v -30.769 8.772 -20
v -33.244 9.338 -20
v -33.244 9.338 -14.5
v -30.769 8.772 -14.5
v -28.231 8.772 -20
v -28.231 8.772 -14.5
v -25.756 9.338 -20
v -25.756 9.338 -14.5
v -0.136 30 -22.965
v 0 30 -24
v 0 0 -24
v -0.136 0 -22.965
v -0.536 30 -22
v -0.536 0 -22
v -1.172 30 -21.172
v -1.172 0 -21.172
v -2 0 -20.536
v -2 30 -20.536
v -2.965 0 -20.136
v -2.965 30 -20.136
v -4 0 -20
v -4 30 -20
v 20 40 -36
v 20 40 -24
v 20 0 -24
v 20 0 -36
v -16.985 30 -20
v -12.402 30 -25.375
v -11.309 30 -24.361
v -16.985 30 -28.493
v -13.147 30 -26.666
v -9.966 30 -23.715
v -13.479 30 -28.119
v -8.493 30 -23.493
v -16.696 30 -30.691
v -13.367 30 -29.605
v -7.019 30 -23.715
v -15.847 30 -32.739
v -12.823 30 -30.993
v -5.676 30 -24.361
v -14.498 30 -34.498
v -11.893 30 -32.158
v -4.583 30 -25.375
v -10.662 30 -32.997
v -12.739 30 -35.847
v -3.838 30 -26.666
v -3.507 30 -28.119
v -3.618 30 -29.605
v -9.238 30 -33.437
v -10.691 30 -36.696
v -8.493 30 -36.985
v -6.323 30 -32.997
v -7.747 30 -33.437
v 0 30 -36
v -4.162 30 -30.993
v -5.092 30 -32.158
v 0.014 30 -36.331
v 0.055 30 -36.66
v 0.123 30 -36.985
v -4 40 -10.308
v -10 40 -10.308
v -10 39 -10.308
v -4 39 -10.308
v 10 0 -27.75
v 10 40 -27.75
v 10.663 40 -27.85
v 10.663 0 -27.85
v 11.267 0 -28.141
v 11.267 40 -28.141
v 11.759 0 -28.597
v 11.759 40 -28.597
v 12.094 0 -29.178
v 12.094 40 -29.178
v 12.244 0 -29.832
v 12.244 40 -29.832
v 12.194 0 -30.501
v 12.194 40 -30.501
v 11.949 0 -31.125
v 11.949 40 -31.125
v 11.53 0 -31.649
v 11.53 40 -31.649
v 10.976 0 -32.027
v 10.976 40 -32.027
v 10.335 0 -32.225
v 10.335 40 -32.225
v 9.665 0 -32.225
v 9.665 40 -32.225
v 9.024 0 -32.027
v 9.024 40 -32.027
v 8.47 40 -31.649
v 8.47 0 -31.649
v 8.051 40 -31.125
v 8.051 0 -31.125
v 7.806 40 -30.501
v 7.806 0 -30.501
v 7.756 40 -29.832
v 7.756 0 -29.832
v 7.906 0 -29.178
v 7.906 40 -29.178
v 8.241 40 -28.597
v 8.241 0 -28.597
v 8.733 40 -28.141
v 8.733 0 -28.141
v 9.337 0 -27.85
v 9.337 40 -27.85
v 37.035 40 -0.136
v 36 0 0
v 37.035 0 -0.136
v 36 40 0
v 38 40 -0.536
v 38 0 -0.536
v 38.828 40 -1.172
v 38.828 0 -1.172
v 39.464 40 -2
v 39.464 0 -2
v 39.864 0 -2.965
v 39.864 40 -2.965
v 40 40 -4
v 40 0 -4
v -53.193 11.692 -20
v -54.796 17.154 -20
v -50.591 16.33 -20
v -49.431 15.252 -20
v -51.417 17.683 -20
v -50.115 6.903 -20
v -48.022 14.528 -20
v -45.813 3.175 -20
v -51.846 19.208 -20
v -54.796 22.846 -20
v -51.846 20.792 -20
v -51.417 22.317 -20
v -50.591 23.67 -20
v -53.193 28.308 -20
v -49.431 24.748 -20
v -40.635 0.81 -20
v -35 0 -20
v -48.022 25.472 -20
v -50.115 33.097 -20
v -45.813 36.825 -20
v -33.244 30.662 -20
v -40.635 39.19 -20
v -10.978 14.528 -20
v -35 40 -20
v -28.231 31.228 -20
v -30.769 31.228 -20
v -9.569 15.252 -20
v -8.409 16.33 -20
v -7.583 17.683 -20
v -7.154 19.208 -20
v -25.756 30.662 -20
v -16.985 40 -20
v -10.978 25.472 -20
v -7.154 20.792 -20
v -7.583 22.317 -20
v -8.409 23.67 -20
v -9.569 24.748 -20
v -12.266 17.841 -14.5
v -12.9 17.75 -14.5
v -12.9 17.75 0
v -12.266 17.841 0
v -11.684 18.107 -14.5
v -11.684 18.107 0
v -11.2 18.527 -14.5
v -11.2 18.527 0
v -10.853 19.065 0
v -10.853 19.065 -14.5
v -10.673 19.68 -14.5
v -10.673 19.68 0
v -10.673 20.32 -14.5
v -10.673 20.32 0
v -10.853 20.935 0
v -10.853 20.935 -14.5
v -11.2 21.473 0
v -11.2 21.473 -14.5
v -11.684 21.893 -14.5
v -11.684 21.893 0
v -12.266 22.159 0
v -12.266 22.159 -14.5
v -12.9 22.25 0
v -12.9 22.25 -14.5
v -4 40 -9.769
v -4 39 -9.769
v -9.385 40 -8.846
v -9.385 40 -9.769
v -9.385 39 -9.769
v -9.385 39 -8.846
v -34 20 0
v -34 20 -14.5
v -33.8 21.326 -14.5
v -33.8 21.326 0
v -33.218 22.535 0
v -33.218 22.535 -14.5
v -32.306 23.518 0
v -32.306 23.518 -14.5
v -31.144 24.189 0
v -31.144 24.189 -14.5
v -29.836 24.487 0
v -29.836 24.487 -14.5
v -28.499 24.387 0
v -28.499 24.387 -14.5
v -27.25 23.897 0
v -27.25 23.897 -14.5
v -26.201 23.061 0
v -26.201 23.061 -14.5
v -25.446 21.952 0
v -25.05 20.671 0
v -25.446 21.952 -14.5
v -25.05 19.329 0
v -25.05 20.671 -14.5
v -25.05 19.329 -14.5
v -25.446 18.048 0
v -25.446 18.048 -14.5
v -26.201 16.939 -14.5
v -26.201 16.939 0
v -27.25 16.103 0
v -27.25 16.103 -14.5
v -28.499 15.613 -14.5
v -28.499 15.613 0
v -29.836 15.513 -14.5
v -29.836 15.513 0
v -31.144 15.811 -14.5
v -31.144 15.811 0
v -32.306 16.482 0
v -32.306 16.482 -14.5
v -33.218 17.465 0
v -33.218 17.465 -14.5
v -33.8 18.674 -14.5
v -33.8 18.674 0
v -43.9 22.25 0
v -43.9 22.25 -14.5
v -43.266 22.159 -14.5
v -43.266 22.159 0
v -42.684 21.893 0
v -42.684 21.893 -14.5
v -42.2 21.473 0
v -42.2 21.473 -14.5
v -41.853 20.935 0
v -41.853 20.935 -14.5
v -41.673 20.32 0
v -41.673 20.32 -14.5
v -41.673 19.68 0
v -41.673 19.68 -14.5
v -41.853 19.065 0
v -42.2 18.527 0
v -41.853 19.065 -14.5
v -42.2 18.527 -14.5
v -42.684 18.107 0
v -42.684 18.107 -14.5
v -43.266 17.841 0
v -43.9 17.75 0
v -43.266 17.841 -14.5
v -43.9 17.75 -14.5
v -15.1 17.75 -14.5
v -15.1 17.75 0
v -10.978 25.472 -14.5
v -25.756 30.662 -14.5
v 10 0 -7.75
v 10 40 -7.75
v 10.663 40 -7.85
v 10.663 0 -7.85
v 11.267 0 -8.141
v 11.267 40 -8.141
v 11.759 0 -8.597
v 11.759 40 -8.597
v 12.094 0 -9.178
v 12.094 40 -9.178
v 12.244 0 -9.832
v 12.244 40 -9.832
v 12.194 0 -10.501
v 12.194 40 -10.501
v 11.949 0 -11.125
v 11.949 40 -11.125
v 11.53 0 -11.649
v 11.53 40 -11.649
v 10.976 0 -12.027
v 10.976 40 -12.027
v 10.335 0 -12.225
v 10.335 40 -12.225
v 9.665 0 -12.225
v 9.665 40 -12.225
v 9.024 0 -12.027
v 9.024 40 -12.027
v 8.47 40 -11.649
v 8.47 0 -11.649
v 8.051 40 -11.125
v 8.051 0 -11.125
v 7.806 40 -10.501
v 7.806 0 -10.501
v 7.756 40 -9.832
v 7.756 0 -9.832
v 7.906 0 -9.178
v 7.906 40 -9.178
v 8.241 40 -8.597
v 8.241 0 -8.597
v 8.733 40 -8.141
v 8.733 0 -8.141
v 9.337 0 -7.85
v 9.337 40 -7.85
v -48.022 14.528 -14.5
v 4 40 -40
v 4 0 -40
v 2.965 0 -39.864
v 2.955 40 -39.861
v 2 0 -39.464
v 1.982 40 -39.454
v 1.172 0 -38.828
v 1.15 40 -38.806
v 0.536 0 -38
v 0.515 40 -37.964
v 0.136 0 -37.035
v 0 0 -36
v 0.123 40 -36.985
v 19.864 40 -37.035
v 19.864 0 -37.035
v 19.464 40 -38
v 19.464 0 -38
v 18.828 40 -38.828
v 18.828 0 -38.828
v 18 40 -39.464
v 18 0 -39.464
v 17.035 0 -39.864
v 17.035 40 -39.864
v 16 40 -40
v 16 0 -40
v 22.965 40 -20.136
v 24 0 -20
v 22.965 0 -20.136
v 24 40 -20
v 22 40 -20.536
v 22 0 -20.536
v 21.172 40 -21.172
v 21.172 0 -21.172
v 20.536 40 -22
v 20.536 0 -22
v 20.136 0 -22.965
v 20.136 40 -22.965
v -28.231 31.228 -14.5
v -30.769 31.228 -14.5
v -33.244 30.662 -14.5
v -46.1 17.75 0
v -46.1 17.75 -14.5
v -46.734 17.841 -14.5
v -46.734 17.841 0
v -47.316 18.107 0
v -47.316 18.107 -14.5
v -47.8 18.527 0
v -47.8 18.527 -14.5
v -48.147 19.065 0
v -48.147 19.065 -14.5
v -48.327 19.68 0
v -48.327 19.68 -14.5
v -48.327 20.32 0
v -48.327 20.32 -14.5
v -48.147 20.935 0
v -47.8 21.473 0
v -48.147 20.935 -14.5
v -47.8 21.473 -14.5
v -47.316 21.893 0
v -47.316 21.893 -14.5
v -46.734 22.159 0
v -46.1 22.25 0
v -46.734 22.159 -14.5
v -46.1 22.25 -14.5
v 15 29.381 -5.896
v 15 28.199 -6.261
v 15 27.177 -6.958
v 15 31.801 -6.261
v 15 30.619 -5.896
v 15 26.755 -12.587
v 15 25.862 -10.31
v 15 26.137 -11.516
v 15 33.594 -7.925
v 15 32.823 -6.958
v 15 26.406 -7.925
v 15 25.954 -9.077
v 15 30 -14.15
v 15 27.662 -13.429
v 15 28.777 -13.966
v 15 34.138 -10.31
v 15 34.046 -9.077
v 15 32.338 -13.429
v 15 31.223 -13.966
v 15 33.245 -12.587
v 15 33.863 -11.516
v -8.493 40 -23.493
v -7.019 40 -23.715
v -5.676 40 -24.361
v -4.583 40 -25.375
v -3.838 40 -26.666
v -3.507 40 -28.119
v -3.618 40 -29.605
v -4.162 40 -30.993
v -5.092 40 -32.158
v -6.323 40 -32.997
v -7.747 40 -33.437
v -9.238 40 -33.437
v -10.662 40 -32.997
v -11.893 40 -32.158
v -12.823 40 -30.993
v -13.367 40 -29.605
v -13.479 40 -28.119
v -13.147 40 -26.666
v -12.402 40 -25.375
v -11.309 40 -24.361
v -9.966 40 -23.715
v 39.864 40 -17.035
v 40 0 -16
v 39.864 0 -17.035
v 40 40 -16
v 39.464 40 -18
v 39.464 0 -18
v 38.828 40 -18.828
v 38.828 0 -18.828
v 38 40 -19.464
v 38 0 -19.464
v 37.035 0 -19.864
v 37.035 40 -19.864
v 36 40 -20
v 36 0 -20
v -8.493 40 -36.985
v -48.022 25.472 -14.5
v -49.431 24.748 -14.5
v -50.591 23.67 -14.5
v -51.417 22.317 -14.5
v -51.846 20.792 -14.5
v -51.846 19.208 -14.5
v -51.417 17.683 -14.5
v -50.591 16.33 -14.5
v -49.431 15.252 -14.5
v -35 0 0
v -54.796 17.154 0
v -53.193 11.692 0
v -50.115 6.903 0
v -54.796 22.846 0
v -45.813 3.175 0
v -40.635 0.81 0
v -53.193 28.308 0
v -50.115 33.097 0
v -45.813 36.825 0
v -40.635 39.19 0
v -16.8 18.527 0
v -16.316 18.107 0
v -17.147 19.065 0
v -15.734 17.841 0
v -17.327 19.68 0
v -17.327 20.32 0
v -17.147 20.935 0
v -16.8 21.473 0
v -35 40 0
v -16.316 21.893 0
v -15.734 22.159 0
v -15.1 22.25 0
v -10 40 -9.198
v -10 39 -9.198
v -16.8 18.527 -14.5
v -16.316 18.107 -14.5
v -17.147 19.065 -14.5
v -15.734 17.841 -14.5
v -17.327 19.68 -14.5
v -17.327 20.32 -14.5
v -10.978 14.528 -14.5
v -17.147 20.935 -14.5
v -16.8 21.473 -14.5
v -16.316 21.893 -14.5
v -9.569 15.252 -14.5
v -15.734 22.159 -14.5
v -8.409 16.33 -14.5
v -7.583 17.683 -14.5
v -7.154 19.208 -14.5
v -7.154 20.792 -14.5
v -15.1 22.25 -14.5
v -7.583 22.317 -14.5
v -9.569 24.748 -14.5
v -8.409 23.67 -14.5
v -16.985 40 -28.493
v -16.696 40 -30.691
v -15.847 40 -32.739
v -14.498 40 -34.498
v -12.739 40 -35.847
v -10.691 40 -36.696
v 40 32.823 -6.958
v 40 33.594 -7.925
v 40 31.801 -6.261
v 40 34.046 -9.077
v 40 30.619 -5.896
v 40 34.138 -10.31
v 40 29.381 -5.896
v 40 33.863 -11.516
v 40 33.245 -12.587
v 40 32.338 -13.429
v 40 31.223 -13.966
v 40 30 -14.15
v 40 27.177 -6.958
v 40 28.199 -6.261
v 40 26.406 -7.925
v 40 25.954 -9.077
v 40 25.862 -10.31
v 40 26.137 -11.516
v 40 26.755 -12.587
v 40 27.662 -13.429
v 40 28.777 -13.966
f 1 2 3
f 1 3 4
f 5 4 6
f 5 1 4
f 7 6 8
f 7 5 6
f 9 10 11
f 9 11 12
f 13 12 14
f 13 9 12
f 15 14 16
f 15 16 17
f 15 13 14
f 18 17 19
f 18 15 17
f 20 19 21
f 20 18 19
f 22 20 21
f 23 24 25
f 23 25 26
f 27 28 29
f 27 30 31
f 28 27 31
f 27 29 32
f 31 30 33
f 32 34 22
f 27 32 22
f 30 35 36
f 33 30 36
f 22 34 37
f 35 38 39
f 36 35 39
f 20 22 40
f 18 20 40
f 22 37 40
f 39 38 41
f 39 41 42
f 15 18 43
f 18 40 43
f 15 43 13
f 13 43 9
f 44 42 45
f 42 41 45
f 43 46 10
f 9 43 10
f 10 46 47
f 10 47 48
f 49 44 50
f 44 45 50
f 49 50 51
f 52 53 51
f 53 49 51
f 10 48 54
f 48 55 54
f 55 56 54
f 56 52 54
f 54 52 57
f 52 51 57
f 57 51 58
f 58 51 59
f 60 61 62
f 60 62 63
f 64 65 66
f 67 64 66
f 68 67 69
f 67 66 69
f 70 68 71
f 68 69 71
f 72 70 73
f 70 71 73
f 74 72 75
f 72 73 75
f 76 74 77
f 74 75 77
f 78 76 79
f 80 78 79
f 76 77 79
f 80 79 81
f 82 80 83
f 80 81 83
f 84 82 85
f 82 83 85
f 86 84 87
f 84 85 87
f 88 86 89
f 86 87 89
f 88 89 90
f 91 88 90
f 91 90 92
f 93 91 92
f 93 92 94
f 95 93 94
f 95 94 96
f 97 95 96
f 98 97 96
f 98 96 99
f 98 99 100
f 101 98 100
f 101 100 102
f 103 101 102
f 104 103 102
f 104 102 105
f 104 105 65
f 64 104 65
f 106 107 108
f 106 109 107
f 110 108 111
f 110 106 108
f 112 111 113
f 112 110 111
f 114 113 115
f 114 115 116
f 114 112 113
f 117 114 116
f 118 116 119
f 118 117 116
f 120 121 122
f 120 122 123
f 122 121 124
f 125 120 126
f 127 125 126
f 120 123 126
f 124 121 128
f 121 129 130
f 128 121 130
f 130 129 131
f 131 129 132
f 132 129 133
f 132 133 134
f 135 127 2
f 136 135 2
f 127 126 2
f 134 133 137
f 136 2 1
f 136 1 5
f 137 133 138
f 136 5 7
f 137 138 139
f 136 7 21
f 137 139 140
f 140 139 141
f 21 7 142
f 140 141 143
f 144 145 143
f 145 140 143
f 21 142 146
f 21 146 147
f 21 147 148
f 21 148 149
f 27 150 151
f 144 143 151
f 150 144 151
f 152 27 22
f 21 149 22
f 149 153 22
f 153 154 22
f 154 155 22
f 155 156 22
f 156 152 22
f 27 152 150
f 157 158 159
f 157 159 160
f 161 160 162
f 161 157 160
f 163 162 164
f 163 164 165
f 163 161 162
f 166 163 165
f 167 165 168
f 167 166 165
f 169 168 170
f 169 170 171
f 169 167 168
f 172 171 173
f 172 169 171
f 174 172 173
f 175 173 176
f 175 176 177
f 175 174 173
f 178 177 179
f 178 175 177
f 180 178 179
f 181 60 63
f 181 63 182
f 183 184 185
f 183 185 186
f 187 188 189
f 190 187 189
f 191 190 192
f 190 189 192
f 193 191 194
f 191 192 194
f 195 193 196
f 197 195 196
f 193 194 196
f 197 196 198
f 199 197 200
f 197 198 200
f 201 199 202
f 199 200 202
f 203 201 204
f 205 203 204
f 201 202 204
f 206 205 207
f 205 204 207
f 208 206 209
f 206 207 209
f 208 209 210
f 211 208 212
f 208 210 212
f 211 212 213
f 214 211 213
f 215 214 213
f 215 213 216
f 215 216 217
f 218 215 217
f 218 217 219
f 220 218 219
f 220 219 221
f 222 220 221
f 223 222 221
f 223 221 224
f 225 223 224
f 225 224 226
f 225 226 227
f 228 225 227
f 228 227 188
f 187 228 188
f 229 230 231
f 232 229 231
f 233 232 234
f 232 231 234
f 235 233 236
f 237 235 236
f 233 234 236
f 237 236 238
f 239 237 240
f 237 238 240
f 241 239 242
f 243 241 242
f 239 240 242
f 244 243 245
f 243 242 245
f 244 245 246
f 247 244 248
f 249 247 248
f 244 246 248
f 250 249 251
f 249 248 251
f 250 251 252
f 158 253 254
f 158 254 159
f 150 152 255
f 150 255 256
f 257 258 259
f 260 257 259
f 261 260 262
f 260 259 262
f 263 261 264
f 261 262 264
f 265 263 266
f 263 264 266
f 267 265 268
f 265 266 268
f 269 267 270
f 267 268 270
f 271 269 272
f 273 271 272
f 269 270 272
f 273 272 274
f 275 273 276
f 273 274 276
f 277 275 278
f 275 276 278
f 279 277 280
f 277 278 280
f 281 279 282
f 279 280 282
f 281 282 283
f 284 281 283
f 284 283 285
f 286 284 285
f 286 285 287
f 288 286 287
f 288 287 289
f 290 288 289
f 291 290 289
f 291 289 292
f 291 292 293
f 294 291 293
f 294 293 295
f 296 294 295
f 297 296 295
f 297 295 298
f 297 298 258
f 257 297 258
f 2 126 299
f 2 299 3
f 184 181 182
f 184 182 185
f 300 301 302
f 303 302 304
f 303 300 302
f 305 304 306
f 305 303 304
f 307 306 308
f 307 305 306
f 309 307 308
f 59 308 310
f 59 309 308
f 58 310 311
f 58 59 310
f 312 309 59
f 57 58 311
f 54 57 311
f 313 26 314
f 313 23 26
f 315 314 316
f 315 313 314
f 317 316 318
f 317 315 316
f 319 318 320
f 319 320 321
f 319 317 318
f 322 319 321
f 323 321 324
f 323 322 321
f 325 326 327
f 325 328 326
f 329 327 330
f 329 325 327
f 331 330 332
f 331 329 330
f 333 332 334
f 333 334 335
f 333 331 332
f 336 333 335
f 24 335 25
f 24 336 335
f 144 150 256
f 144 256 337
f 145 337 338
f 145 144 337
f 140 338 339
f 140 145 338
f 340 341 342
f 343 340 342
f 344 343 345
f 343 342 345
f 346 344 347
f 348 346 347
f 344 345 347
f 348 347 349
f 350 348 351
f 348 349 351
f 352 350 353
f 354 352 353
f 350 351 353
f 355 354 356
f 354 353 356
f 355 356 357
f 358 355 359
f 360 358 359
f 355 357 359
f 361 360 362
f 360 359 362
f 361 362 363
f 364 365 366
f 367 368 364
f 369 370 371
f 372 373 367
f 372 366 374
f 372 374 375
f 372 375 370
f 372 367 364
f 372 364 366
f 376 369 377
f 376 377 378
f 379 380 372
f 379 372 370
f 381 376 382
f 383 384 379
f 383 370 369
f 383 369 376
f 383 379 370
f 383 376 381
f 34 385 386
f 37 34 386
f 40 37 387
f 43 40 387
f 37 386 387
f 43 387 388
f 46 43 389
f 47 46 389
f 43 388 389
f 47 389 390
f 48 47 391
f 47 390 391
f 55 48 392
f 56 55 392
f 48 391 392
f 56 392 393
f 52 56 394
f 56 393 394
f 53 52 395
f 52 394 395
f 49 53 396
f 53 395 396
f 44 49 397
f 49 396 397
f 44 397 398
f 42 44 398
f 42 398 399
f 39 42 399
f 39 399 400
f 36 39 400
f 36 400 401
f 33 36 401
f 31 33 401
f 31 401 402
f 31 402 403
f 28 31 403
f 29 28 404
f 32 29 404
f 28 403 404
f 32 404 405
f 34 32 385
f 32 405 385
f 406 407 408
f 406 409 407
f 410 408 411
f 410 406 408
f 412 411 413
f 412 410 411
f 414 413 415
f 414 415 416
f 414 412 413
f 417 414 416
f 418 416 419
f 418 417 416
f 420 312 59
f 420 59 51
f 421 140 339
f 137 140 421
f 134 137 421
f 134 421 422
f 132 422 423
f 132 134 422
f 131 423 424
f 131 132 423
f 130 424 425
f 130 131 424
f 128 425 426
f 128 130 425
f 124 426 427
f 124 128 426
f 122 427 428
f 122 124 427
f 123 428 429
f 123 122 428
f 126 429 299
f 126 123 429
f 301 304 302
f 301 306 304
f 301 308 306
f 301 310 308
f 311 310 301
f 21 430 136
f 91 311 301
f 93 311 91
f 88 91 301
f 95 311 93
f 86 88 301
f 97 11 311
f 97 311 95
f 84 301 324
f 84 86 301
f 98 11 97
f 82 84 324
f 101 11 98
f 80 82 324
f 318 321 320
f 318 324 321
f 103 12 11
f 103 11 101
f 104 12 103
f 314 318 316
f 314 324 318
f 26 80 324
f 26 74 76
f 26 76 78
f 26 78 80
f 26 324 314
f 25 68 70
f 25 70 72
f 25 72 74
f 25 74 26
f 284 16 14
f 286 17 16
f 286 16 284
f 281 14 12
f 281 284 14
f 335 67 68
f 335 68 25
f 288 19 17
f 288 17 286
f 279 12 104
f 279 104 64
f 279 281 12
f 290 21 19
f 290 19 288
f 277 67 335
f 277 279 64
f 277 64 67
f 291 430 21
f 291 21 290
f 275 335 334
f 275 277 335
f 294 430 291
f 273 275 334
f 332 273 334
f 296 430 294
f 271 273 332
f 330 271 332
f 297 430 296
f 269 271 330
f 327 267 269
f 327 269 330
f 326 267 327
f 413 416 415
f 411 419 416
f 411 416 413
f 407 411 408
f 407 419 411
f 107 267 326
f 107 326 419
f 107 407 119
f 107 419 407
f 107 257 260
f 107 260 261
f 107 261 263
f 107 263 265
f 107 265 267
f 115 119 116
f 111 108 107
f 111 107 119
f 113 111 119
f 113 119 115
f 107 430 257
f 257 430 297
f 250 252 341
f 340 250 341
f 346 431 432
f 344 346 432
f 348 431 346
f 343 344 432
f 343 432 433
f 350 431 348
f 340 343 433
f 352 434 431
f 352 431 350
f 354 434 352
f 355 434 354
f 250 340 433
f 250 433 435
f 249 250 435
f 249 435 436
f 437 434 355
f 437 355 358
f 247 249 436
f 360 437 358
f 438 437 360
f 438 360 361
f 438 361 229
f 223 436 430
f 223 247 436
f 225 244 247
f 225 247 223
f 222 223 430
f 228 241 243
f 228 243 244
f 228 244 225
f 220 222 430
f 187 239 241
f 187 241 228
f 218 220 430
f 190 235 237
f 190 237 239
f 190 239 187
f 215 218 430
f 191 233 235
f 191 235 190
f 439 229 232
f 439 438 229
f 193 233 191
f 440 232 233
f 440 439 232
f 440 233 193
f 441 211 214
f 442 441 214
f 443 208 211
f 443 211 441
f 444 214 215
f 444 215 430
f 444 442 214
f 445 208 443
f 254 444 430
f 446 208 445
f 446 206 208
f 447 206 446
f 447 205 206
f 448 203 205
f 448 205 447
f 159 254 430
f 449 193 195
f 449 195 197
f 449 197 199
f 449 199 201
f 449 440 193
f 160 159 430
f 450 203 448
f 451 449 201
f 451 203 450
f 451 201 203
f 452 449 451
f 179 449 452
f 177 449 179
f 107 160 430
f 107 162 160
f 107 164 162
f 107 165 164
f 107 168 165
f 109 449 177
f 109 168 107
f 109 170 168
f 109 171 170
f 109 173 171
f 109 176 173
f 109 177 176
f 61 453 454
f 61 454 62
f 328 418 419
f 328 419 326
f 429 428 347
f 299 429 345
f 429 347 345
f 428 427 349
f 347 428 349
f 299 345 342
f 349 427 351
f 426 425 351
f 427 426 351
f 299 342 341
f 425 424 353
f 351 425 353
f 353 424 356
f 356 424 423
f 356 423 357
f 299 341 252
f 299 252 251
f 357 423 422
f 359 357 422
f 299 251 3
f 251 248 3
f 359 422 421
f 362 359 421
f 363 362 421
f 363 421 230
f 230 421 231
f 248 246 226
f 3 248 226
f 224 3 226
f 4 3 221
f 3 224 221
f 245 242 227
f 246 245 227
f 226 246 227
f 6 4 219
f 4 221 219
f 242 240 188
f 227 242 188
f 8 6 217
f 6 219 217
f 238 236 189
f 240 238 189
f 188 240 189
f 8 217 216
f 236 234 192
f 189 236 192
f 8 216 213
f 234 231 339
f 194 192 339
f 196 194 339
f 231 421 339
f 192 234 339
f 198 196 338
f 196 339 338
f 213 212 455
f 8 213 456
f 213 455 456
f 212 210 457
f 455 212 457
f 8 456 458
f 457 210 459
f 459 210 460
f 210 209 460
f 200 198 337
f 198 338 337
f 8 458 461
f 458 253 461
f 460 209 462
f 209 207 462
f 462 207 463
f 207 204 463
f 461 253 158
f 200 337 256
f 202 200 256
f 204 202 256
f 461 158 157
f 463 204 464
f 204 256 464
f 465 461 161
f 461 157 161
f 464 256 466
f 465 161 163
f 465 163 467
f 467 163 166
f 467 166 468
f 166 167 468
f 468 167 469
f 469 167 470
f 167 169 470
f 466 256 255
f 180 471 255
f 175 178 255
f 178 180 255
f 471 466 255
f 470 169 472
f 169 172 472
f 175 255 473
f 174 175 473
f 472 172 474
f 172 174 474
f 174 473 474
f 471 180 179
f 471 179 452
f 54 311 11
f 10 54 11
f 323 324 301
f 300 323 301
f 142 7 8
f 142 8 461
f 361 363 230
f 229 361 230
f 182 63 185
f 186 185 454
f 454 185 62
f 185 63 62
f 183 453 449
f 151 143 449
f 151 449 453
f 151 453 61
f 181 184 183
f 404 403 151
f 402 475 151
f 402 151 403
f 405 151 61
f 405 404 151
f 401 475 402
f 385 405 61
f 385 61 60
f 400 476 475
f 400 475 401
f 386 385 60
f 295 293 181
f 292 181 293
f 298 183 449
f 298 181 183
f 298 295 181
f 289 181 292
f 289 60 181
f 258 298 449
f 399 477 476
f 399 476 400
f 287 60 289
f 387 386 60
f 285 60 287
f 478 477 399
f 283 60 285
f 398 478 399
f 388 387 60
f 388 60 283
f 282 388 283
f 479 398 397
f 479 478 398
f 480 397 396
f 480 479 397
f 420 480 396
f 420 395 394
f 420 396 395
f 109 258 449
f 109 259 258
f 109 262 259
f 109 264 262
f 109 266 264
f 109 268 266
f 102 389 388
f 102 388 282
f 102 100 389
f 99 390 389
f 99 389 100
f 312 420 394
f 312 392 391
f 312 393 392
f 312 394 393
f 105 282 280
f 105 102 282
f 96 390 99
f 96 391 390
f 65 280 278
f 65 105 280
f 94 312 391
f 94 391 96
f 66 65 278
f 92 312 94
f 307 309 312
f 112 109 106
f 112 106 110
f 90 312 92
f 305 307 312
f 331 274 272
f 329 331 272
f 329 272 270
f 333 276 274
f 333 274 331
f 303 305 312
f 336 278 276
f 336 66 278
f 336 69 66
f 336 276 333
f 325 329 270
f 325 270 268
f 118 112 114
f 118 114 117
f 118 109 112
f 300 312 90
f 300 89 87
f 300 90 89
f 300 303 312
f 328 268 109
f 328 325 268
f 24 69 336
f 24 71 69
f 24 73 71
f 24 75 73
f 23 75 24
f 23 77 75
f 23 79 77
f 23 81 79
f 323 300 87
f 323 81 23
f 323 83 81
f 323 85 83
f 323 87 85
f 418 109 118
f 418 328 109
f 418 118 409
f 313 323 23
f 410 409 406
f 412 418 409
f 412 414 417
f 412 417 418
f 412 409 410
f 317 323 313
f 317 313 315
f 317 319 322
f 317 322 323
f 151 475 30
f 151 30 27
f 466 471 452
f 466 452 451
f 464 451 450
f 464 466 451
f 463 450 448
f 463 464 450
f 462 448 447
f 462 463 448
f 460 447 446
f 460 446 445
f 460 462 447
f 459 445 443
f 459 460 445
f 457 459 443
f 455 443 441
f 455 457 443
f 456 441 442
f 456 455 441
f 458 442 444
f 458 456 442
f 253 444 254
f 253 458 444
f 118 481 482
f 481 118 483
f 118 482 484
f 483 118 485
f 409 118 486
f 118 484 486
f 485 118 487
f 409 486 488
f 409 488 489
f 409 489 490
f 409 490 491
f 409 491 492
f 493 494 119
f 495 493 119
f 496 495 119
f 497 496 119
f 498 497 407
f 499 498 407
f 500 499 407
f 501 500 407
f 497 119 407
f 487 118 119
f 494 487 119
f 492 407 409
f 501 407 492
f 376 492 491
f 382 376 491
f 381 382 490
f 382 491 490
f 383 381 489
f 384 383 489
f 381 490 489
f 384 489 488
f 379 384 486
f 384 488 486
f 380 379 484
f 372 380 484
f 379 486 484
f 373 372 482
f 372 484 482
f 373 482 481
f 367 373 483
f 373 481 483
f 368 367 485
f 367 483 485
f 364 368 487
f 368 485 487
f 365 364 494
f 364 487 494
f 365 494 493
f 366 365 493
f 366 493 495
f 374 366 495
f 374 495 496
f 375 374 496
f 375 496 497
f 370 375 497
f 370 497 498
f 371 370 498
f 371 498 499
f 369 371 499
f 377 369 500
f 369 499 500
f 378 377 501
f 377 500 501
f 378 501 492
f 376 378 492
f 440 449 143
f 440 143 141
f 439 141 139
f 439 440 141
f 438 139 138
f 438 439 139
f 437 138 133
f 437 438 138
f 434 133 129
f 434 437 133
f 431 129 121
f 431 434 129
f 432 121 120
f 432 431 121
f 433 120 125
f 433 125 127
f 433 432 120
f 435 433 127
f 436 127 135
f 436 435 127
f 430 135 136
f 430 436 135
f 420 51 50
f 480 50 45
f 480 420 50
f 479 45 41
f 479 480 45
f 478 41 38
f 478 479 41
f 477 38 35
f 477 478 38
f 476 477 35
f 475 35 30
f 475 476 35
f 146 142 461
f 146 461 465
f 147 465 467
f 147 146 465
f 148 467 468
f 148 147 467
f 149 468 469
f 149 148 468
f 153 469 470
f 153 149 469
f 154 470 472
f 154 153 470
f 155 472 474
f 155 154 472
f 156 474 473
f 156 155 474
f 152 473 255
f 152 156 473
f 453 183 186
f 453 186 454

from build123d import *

# Parameters (mm, degrees)
SALIENTE_EXTRUIR1_DEPTH = 40
CROQUIS4_R              = 2.25
CORTAR_EXTRUIR3_DEPTH   = 70.282032303
SALIENTE_EXTRUIR2_DEPTH = 20
CROQUIS8_R              = 4.15
CORTAR_EXTRUIR4_DEPTH   = 25
CROQUIS9_R              = 4.5
CORTAR_EXTRUIR6_DEPTH   = 20
CROQUIS9_4_R            = 4.5
CORTAR_EXTRUIR7_DEPTH   = 5.5
REDONDEO3_R             = 4
CORTAR_EXTRUIR8_DEPTH   = 1
CROQUIS11_R             = 5
SALIENTE_EXTRUIR3_DEPTH = 10


with BuildPart() as part:
    # Croquis1 → Saliente-Extruir1 (new body)
    with BuildSketch(Plane(origin=(0, 0, 0), x_dir=(1, 0, 0), z_dir=(0, 1, 0))):
        Polygon((0, 0), (40, 0), (40, 20), (20, 20), (20, 40), (0, 40), align=None)
    extrude(amount=SALIENTE_EXTRUIR1_DEPTH)

    # Croquis4 → Cortar-Extruir3 (cut, through all)
    with BuildSketch(Plane(origin=(0, 40, 0), x_dir=(1, 0, 0), z_dir=(0, 1, 0))):
        with Locations((10, 30)):
            Circle(CROQUIS4_R)
        with Locations((10, 10)):
            Circle(CROQUIS4_R)
    extrude(amount=-CORTAR_EXTRUIR3_DEPTH, mode=Mode.SUBTRACT)

    # Croquis5 → Saliente-Extruir2 (add)
    with BuildSketch(Plane.XY):
        with BuildLine():
            Line((0, 0), (0, 40))
            Line((0, 40), (-35, 40))
            ThreePointArc((-35, 40), (-55, 20), (-35, 0))
            Line((-35, 0), (0, 0))
        make_face()
    extrude(amount=-SALIENTE_EXTRUIR2_DEPTH)

    # Croquis8 → Cortar-Extruir4 (cut)
    with BuildSketch(Plane(origin=(40, 0, 0), x_dir=(0, 0, -1), z_dir=(1, 0, 0))):
        with Locations((10, 30)):
            Circle(CROQUIS8_R)
    extrude(amount=-CORTAR_EXTRUIR4_DEPTH, mode=Mode.SUBTRACT)

    # Croquis9 → Cortar-Extruir6 (cut)
    with BuildSketch(Plane(origin=(0, 0, -20), x_dir=(-1, 0, 0), z_dir=(0, 0, -1))):
        with Locations((29.5, 20)):
            Circle(CROQUIS9_R)
        with BuildLine():
            Line((12.9, 22.25), (15.1, 22.25))
            ThreePointArc((15.1, 22.25), (17.35, 20), (15.1, 17.75))
            Line((15.1, 17.75), (12.9, 17.75))
            ThreePointArc((12.9, 17.75), (10.65, 20), (12.9, 22.25))
        make_face()
        with BuildLine():
            Line((43.9, 17.75), (46.1, 17.75))
            ThreePointArc((46.1, 17.75), (48.35, 20), (46.1, 22.25))
            Line((46.1, 22.25), (43.9, 22.25))
            ThreePointArc((43.9, 22.25), (41.65, 20), (43.9, 17.75))
        make_face()
    extrude(amount=-CORTAR_EXTRUIR6_DEPTH, mode=Mode.SUBTRACT)

    # Croquis9<4> → Cortar-Extruir7 (cut)
    with BuildSketch(Plane(origin=(0, 0, -20), x_dir=(-1, 0, 0), z_dir=(0, 0, -1))):
        with BuildLine():
            Line((10.978313253, 25.472396189), (25.756024096, 30.661737402))
            ThreePointArc((25.756024096, 30.661737402), (29.5, 31.3), (33.243975904, 30.661737402))
            Line((33.243975904, 30.661737402), (48.021686747, 25.472396189))
            ThreePointArc((48.021686747, 25.472396189), (51.9, 20), (48.021686747, 14.527603811))
            Line((48.021686747, 14.527603811), (33.243975904, 9.338262598))
            ThreePointArc((33.243975904, 9.338262598), (29.5, 8.7), (25.756024096, 9.338262598))
            Line((25.756024096, 9.338262598), (10.978313253, 14.527603811))
            ThreePointArc((10.978313253, 14.527603811), (7.1, 20), (10.978313253, 25.472396189))
        make_face()
        with Locations((29.5, 20)):
            Circle(CROQUIS9_4_R, mode=Mode.SUBTRACT)
        with BuildLine():
            Line((12.9, 22.25), (15.1, 22.25))
            ThreePointArc((15.1, 22.25), (17.35, 20), (15.1, 17.75))
            Line((15.1, 17.75), (12.9, 17.75))
            ThreePointArc((12.9, 17.75), (10.65, 20), (12.9, 22.25))
        make_face(mode=Mode.SUBTRACT)
        with BuildLine():
            Line((43.9, 17.75), (46.1, 17.75))
            ThreePointArc((46.1, 17.75), (48.35, 20), (46.1, 22.25))
            Line((46.1, 22.25), (43.9, 22.25))
            ThreePointArc((43.9, 22.25), (41.65, 20), (43.9, 17.75))
        make_face(mode=Mode.SUBTRACT)
    extrude(amount=-CORTAR_EXTRUIR7_DEPTH, mode=Mode.SUBTRACT)

    # Redondeo3
    redondeo3_edges = [part.edges().sort_by_distance(p)[0] for p in [
        (40, 20, 0),
        (40, 20, -20),
        (20, 20, -20),
        (20, 20, -40),
        (0, 20, -40),
        (0, 20, -20),
    ]]
    fillet(redondeo3_edges, radius=REDONDEO3_R)

    # Croquis10 → Cortar-Extruir8 (cut)
    with BuildSketch(Plane(origin=(0, 40, 0), x_dir=(1, 0, 0), z_dir=(0, 1, 0))):
        Polygon((-10, 9.198317308), (-10, 10.307692308), (-4, 10.307692308), (-4, 9.769230769), (-9.384615385, 9.769230769), (-9.384615385, 8.846153846), align=None)
    extrude(amount=-CORTAR_EXTRUIR8_DEPTH, mode=Mode.SUBTRACT)

    # Croquis11 → Saliente-Extruir3 (add)
    with BuildSketch(Plane(origin=(0, 40, 0), x_dir=(1, 0, 0), z_dir=(0, 1, 0))):
        with BuildLine():
            Line((-16.985046875, 28.492523438), (-16.985046875, 20))
            Line((-16.985046875, 20), (-4, 20))
            ThreePointArc((-4, 20), (-1.171572875, 21.171572875), (0, 24))
            Line((0, 24), (0.123186534, 36.985046875))
            Line((0.123186534, 36.985046875), (-8.492523438, 36.985046875))
            ThreePointArc((-8.492523438, 36.985046875), (-14.49764435, 34.49764435), (-16.985046875, 28.492523438))
        make_face()
        with Locations((-8.492523438, 28.492523438)):
            Circle(CROQUIS11_R, mode=Mode.SUBTRACT)
    extrude(amount=-SALIENTE_EXTRUIR3_DEPTH)


solid = part.part
